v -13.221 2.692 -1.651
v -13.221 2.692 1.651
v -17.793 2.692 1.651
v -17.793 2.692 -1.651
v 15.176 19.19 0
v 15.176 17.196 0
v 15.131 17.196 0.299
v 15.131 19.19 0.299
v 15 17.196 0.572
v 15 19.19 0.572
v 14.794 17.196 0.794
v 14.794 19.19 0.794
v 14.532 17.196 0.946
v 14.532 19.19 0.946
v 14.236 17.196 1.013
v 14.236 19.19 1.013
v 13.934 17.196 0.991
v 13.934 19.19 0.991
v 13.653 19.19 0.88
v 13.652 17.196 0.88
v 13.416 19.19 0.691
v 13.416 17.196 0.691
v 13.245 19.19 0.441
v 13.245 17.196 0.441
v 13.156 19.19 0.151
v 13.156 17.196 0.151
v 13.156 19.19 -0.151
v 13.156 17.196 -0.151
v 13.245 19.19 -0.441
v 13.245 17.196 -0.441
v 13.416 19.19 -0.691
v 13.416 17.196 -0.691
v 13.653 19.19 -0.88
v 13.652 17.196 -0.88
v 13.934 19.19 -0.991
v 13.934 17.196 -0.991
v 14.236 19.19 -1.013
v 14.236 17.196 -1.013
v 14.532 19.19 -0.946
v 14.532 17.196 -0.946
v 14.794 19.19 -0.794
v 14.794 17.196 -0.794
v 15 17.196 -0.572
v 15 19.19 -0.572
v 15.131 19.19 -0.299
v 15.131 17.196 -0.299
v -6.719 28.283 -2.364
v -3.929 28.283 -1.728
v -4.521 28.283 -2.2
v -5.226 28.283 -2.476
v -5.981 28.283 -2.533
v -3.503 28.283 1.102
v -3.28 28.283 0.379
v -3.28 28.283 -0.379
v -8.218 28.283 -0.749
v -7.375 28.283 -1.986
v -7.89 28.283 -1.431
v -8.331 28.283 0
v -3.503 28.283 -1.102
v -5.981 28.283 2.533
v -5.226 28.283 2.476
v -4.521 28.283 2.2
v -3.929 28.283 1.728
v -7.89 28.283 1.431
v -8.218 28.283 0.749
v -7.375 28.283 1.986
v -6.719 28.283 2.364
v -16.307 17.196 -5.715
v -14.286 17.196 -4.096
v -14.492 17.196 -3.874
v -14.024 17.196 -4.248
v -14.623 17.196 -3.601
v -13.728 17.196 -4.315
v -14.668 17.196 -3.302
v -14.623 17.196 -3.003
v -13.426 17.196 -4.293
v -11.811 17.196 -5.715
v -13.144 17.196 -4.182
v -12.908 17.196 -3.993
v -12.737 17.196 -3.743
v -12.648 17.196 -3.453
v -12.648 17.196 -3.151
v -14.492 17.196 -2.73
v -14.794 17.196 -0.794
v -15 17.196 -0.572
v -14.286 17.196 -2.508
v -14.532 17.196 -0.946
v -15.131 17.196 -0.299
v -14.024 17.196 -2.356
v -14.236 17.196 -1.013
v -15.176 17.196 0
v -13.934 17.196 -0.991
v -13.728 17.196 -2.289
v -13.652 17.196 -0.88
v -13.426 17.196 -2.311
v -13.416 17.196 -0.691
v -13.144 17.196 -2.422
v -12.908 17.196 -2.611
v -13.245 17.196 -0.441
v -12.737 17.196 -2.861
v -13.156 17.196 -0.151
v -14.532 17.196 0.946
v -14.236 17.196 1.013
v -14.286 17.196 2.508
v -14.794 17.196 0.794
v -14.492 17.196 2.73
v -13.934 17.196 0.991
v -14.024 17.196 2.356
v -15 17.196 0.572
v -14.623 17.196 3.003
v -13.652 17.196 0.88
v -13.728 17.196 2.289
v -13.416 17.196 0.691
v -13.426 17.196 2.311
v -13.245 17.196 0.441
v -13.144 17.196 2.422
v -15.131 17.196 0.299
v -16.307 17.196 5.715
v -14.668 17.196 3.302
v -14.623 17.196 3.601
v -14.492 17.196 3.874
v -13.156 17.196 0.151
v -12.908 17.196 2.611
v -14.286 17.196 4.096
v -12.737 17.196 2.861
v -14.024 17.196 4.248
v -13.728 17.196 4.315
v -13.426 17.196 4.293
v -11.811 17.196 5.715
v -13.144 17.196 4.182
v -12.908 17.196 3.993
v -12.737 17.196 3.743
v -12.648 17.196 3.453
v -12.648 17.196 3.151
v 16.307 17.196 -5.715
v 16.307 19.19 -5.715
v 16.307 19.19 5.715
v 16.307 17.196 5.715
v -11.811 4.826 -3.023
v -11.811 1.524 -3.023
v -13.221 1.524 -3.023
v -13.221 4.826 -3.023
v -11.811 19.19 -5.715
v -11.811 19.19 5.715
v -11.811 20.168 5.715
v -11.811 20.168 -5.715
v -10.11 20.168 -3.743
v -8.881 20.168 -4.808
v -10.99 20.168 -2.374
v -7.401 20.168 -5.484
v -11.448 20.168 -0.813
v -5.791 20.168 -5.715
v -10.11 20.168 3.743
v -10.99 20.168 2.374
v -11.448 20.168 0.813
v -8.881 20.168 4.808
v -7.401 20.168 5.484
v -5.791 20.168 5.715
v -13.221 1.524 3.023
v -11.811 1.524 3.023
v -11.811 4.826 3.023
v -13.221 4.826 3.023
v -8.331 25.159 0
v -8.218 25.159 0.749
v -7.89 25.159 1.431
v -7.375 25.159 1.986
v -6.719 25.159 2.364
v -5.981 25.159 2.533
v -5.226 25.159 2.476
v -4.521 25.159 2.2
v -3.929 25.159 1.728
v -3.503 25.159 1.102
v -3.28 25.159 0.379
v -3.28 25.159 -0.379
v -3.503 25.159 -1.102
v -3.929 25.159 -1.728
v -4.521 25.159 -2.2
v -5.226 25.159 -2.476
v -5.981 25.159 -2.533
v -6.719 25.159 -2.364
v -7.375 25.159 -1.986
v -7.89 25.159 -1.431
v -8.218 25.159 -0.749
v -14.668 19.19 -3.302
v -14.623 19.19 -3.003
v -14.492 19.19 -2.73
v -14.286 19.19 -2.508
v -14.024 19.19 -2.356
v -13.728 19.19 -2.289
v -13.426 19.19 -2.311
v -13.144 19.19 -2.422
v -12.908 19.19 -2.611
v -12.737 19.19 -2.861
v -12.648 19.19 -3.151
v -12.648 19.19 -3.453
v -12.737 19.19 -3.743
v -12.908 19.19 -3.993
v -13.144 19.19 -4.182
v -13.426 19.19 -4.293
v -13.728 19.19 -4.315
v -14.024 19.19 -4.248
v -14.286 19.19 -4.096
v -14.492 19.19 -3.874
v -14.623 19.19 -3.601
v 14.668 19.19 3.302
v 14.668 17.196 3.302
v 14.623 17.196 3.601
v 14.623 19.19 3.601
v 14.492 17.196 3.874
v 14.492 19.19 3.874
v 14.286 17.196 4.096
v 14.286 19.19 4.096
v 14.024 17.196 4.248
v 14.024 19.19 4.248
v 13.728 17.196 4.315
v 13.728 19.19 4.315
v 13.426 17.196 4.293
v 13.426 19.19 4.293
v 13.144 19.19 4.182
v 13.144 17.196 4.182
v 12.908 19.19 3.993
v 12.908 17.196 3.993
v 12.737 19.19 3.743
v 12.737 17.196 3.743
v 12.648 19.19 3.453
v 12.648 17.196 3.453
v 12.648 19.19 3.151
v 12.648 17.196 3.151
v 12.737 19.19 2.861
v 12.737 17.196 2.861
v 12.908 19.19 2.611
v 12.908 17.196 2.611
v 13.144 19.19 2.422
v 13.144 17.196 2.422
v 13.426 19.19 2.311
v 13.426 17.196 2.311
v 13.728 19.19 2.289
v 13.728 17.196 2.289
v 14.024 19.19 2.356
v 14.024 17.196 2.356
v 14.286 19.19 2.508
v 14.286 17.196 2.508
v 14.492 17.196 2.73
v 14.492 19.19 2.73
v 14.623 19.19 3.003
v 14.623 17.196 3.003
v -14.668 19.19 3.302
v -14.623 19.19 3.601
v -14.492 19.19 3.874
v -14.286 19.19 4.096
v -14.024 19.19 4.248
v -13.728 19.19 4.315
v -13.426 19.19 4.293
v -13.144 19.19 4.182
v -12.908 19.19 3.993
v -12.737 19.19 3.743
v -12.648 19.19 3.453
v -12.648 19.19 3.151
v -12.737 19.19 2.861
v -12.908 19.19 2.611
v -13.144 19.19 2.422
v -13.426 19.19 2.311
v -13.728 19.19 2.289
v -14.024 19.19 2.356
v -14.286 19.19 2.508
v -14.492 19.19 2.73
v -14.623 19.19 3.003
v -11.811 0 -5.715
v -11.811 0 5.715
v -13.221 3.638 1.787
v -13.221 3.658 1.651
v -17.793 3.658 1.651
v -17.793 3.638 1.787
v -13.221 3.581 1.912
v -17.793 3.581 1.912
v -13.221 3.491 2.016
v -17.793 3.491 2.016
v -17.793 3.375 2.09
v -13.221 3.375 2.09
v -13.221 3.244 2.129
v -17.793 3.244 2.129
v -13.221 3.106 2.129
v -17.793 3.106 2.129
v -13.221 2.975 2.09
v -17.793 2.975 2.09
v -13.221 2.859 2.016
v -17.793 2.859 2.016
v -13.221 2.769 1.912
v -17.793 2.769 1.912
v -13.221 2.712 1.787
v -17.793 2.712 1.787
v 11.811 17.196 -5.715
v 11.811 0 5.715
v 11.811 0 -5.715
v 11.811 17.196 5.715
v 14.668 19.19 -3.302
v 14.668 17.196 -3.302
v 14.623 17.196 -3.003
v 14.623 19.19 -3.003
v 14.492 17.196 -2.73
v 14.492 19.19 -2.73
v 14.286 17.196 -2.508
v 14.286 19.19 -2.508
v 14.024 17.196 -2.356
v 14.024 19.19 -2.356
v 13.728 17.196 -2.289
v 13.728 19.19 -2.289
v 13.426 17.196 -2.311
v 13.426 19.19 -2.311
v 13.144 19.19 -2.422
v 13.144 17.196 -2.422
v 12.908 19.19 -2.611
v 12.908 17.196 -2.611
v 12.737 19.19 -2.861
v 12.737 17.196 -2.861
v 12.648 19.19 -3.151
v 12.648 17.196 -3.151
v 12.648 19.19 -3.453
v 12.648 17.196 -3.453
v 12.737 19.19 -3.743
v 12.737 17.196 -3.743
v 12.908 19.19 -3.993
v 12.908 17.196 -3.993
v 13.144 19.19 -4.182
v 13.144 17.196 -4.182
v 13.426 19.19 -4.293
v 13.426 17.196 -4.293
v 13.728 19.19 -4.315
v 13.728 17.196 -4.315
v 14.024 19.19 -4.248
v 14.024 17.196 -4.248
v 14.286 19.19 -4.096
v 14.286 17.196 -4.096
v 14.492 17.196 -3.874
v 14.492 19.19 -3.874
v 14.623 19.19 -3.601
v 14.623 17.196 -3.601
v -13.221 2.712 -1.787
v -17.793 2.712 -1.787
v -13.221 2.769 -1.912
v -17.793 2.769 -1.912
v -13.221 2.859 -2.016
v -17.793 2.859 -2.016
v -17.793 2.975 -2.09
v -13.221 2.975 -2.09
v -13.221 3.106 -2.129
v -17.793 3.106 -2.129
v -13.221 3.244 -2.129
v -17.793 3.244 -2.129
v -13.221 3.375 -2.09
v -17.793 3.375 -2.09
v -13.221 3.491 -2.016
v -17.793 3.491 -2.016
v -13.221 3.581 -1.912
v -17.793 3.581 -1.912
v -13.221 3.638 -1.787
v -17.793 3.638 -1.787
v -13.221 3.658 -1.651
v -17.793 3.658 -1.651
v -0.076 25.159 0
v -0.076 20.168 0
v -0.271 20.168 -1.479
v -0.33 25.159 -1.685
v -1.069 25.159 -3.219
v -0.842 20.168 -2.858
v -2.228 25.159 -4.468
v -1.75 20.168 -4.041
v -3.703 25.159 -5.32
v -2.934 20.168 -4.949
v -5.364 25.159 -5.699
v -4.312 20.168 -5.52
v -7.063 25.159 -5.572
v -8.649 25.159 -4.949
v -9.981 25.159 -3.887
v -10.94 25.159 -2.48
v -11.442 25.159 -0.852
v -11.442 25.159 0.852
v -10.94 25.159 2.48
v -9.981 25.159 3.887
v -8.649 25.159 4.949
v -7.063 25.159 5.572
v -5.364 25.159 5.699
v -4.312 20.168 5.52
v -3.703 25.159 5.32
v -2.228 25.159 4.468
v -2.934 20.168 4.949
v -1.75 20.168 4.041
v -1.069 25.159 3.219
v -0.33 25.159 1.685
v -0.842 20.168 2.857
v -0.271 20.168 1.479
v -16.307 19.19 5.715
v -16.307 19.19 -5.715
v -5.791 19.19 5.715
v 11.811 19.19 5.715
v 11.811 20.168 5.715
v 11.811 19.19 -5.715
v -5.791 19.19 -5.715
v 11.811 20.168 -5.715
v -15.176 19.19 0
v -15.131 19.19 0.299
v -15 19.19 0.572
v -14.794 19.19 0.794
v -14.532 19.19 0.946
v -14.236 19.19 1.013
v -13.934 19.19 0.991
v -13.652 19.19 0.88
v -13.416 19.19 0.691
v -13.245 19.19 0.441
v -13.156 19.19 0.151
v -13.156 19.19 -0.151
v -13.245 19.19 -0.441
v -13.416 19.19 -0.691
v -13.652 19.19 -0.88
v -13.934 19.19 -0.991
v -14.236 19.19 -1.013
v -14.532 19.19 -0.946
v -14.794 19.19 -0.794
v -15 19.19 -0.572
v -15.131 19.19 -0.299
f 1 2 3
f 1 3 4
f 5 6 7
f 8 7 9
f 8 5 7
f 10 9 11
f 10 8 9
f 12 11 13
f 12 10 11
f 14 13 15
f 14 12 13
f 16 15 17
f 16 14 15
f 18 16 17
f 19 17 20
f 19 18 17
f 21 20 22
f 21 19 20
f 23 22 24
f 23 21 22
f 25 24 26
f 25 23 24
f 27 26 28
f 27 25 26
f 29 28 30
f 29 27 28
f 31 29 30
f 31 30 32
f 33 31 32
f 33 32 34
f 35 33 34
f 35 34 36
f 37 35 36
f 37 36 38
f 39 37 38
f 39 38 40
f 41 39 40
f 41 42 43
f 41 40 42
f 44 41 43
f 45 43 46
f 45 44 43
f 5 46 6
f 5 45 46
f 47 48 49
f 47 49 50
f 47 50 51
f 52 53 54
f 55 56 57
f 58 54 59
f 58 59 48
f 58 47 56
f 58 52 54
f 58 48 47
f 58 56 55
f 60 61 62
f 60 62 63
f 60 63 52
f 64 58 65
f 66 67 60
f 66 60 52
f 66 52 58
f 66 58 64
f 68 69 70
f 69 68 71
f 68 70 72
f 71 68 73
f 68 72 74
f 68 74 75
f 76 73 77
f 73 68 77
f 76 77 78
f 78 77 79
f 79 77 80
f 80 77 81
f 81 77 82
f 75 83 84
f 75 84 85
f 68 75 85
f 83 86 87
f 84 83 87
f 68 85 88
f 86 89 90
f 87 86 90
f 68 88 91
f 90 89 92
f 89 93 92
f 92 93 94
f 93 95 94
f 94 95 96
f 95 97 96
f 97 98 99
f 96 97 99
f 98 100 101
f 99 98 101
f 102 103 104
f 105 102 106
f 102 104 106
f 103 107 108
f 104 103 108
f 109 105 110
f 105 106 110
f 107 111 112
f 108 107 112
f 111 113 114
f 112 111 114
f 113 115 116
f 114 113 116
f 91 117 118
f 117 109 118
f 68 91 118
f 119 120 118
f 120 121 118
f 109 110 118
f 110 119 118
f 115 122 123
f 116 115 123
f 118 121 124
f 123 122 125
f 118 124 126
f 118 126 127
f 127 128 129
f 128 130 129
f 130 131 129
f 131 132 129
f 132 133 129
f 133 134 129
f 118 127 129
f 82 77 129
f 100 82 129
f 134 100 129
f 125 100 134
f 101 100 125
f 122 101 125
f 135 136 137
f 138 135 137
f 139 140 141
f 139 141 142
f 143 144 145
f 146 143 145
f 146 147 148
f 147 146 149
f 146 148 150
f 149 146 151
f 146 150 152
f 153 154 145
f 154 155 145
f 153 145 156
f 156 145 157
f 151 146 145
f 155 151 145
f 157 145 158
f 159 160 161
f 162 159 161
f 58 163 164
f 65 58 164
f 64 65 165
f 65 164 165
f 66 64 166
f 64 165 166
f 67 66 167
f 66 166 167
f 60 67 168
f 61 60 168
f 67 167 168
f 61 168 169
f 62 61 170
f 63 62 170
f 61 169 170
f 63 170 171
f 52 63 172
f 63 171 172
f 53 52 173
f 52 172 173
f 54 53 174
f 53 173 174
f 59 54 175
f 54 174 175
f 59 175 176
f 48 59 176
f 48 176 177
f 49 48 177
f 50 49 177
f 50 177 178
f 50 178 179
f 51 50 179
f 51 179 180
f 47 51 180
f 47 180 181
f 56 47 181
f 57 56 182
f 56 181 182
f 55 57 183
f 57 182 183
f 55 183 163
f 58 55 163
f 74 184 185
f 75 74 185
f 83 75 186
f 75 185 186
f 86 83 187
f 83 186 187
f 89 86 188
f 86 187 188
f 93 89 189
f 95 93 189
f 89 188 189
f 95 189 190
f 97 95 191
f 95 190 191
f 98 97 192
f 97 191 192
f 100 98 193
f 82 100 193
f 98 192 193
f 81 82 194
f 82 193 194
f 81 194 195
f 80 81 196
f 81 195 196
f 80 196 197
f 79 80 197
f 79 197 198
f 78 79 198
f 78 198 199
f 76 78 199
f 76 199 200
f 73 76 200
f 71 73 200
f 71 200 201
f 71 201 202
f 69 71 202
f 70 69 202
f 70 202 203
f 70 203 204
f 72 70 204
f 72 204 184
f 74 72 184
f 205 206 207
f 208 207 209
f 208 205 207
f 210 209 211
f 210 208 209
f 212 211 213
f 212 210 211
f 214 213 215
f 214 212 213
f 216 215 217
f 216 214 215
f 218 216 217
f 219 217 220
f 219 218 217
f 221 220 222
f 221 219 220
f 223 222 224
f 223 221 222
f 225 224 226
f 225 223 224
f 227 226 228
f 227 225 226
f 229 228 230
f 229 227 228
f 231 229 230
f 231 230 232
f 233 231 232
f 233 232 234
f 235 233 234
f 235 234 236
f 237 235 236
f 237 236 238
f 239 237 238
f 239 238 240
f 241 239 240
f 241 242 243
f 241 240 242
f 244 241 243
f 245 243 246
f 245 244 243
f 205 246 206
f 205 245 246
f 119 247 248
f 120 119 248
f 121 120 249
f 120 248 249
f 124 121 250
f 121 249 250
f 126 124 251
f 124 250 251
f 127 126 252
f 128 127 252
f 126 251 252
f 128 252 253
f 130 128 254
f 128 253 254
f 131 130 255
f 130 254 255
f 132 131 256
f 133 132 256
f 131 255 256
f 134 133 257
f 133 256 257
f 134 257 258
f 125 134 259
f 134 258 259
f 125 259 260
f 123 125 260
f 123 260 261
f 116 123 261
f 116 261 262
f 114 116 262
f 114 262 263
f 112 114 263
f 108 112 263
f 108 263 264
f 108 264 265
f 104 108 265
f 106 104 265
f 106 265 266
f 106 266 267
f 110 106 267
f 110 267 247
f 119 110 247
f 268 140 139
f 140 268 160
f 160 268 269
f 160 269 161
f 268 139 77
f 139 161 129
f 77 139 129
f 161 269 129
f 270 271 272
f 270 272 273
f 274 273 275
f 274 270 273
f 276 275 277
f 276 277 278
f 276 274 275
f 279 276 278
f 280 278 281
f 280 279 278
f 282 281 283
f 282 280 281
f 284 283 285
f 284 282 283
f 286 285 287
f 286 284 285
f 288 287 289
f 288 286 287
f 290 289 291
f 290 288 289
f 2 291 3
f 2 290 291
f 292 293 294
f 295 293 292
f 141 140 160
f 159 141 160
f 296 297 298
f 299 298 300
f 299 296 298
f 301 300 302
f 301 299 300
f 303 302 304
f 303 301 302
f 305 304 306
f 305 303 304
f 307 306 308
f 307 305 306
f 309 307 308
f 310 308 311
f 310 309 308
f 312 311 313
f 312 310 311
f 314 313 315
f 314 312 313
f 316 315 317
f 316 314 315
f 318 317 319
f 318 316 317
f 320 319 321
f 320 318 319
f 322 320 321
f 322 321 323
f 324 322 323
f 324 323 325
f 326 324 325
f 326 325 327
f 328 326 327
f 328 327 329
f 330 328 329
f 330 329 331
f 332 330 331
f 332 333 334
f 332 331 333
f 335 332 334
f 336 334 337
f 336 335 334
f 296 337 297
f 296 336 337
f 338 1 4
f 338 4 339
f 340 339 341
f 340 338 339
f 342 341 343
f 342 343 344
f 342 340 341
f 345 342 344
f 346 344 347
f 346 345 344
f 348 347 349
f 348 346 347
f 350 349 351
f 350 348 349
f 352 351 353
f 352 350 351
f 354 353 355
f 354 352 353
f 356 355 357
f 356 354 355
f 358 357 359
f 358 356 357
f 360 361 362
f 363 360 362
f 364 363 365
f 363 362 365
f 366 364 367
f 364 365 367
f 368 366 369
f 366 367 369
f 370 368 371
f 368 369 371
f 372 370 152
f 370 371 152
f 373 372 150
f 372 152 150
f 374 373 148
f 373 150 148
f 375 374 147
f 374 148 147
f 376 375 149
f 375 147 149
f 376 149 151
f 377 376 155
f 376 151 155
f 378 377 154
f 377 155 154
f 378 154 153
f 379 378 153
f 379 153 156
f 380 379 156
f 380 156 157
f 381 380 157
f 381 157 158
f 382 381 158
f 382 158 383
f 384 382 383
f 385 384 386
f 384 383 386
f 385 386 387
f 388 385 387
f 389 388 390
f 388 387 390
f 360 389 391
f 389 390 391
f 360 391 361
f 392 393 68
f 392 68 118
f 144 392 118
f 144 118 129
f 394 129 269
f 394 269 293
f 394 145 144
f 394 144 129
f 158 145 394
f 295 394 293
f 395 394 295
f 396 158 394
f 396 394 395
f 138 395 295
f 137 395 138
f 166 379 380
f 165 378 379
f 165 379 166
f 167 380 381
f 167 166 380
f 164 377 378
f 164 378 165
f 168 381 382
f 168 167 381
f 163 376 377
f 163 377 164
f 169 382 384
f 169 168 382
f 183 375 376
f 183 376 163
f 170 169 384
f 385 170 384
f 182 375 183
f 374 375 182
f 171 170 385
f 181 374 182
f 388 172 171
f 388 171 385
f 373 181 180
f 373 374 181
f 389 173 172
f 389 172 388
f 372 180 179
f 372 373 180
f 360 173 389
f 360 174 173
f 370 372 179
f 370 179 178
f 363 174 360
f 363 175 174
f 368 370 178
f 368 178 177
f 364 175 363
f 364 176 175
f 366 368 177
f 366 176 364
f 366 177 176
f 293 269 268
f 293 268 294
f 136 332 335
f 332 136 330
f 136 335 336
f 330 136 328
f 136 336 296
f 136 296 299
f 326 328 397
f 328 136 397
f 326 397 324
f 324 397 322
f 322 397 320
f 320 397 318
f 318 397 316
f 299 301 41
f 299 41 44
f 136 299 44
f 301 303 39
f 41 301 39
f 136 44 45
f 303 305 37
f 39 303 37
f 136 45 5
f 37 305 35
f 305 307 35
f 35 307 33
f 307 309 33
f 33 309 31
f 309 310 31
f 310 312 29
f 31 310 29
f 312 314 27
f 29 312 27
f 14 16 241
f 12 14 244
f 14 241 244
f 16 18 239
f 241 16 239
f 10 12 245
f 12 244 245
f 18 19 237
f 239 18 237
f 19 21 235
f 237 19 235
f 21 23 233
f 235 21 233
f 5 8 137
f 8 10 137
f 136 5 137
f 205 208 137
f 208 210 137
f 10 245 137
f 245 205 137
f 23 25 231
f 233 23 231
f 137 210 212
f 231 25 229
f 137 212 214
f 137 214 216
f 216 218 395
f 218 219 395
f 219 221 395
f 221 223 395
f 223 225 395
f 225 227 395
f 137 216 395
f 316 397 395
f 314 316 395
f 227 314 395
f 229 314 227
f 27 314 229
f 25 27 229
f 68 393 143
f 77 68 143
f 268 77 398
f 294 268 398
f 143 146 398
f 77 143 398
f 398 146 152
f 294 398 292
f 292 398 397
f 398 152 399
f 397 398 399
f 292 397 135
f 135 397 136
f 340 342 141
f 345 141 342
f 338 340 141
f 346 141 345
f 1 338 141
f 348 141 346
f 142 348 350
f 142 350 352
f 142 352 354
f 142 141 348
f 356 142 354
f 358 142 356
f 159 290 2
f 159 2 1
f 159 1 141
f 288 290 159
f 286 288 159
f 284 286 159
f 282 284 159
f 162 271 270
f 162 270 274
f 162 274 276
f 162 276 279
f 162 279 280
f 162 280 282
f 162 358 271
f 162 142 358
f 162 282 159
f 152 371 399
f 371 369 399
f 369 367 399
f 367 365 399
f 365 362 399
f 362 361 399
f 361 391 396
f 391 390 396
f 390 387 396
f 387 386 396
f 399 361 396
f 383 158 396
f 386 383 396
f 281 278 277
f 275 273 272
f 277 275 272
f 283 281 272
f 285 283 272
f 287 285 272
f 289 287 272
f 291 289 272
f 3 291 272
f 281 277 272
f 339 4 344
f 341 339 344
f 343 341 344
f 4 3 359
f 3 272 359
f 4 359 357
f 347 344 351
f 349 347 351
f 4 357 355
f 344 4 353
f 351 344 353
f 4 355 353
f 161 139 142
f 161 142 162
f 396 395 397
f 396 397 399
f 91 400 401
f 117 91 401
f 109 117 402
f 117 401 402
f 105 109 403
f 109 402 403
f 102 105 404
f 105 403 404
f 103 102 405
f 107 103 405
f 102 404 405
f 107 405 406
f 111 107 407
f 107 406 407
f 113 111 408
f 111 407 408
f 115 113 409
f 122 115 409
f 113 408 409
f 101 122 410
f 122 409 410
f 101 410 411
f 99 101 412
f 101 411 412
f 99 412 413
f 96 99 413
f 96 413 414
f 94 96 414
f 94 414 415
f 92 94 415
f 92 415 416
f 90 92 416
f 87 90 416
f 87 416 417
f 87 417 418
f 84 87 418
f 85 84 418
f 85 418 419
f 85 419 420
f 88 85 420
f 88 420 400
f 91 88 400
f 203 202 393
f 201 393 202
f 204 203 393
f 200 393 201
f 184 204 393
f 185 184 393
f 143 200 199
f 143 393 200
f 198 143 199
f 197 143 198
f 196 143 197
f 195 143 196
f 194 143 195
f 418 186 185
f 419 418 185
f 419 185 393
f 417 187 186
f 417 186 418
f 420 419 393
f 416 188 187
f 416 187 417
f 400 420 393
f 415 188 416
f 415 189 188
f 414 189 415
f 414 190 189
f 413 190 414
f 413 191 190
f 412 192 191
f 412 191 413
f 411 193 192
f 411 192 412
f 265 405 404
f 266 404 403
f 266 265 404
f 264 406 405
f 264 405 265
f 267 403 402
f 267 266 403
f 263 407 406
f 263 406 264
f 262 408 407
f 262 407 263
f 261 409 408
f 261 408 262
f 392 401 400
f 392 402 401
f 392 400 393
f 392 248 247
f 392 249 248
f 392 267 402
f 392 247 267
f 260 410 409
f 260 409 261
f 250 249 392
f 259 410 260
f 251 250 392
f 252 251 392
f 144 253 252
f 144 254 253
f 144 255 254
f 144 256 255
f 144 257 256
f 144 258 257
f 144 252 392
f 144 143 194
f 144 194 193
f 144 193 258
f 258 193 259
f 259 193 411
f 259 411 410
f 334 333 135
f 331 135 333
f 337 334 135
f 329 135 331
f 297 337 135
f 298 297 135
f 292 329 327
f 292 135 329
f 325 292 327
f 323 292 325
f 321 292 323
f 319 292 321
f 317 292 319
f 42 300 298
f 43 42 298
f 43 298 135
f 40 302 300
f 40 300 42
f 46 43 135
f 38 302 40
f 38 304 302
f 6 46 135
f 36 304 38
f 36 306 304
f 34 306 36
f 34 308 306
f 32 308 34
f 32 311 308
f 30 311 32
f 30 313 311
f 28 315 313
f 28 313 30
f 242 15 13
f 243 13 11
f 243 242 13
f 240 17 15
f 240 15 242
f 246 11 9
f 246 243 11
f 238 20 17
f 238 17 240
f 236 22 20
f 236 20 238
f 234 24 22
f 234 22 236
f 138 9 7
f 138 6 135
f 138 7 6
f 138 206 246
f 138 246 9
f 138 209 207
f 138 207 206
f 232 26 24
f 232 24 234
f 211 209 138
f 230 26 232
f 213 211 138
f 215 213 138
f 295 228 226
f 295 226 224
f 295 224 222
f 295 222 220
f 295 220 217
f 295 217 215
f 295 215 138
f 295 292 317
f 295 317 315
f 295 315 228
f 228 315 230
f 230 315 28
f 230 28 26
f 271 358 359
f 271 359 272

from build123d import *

# Parameters (mm, degrees)
SKETCH1_W           = 23.622
SKETCH1_H           = 20.1676
BOSS_EXTRUDE1_DEPTH = 5.715
SKETCH4_W           = 11.43
SKETCH4_H           = 1.9939
BOSS_EXTRUDE4_DEPTH = 4.4958
BOSS_EXTRUDE5_START = -0.9779
SKETCH5_R           = 5.715
BOSS_EXTRUDE5_DEPTH = 5.969
SKETCH6_R           = 2.54
BOSS_EXTRUDE6_DEPTH = 3.1242
SKETCH7_R           = 1.016
CUT_EXTRUDE1_DEPTH  = 26.822810407
SKETCH8_W           = 6.0452
SKETCH8_H           = 3.302
BOSS_EXTRUDE7_DEPTH = 1.4097
BOSS_EXTRUDE8_DEPTH = 4.572


with BuildPart() as part:
    # Sketch1 → Boss-Extrude1 (new, symmetric)
    with BuildSketch(Plane.XY):
        with Locations((0, 10.0838)):
            Rectangle(SKETCH1_W, SKETCH1_H)
    extrude(amount=BOSS_EXTRUDE1_DEPTH, both=True)

    # Sketch4 → Boss-Extrude4 (add)
    with BuildSketch(Plane.ZY.offset(11.811)):
        with Locations((0, 18.19275)):
            Rectangle(SKETCH4_W, SKETCH4_H)
    boss_extrude4 = extrude(amount=BOSS_EXTRUDE4_DEPTH)

    # Mirror1: Boss-Extrude4 across plane
    add(boss_extrude4.mirror(Plane(origin=(0, 0, 0), x_dir=(0, 0, 1), z_dir=(1, 0, 0))))

    # Sketch5 → Boss-Extrude5 (add)
    with BuildSketch(Plane(origin=(0, 20.1676, 0), x_dir=(1, 0, 0), z_dir=(0, 1, 0)).offset(BOSS_EXTRUDE5_START)):
        with Locations((-5.7912, 0)):
            Circle(SKETCH5_R)
    extrude(amount=BOSS_EXTRUDE5_DEPTH)

    # Sketch6 → Boss-Extrude6 (add)
    with BuildSketch(Plane(origin=(0, 25.1587, 0), x_dir=(1, 0, 0), z_dir=(0, 1, 0))):
        with Locations(Location((-5.7912, 0, 0), (0, 0, 180))):
            Circle(SKETCH6_R)
    extrude(amount=BOSS_EXTRUDE6_DEPTH)

    # Sketch7 → Cut-Extrude1 (cut, through all)
    with BuildSketch(Plane(origin=(0, 19.1897, 0), x_dir=(1, 0, 0), z_dir=(0, 1, 0))):
        with Locations(Location((-13.6525, 3.302, 0), (0, 0, 180))):
            Circle(SKETCH7_R)
        with Locations(Location((-13.6525, -3.302, 0), (0, 0, 180))):
            Circle(SKETCH7_R)
        with Locations(Location((-14.1605, 0, 0), (0, 0, 180))):
            Circle(SKETCH7_R)
    cut_extrude1 = extrude(amount=-CUT_EXTRUDE1_DEPTH, mode=Mode.SUBTRACT)

    # Mirror2: Cut-Extrude1 across plane
    add(cut_extrude1.mirror(Plane(origin=(0, 0, 0), x_dir=(0, 0, 1), z_dir=(1, 0, 0))), mode=Mode.SUBTRACT)

    # Sketch8 → Boss-Extrude7 (add)
    with BuildSketch(Plane.ZY.offset(11.811)):
        with Locations((0, 3.175)):
            Rectangle(SKETCH8_W, SKETCH8_H)
    extrude(amount=BOSS_EXTRUDE7_DEPTH)

    # Sketch9 → Boss-Extrude8 (add)
    with BuildSketch(Plane.ZY.offset(13.2207)):
        with BuildLine():
            Line((1.651, 2.6924), (-1.651, 2.6924))
            ThreePointArc((-1.651, 2.6924), (-2.1336, 3.175), (-1.651, 3.6576))
            Line((-1.651, 3.6576), (1.651, 3.6576))
            ThreePointArc((1.651, 3.6576), (2.1336, 3.175), (1.651, 2.6924))
        make_face()
    extrude(amount=BOSS_EXTRUDE8_DEPTH)


solid = part.part
